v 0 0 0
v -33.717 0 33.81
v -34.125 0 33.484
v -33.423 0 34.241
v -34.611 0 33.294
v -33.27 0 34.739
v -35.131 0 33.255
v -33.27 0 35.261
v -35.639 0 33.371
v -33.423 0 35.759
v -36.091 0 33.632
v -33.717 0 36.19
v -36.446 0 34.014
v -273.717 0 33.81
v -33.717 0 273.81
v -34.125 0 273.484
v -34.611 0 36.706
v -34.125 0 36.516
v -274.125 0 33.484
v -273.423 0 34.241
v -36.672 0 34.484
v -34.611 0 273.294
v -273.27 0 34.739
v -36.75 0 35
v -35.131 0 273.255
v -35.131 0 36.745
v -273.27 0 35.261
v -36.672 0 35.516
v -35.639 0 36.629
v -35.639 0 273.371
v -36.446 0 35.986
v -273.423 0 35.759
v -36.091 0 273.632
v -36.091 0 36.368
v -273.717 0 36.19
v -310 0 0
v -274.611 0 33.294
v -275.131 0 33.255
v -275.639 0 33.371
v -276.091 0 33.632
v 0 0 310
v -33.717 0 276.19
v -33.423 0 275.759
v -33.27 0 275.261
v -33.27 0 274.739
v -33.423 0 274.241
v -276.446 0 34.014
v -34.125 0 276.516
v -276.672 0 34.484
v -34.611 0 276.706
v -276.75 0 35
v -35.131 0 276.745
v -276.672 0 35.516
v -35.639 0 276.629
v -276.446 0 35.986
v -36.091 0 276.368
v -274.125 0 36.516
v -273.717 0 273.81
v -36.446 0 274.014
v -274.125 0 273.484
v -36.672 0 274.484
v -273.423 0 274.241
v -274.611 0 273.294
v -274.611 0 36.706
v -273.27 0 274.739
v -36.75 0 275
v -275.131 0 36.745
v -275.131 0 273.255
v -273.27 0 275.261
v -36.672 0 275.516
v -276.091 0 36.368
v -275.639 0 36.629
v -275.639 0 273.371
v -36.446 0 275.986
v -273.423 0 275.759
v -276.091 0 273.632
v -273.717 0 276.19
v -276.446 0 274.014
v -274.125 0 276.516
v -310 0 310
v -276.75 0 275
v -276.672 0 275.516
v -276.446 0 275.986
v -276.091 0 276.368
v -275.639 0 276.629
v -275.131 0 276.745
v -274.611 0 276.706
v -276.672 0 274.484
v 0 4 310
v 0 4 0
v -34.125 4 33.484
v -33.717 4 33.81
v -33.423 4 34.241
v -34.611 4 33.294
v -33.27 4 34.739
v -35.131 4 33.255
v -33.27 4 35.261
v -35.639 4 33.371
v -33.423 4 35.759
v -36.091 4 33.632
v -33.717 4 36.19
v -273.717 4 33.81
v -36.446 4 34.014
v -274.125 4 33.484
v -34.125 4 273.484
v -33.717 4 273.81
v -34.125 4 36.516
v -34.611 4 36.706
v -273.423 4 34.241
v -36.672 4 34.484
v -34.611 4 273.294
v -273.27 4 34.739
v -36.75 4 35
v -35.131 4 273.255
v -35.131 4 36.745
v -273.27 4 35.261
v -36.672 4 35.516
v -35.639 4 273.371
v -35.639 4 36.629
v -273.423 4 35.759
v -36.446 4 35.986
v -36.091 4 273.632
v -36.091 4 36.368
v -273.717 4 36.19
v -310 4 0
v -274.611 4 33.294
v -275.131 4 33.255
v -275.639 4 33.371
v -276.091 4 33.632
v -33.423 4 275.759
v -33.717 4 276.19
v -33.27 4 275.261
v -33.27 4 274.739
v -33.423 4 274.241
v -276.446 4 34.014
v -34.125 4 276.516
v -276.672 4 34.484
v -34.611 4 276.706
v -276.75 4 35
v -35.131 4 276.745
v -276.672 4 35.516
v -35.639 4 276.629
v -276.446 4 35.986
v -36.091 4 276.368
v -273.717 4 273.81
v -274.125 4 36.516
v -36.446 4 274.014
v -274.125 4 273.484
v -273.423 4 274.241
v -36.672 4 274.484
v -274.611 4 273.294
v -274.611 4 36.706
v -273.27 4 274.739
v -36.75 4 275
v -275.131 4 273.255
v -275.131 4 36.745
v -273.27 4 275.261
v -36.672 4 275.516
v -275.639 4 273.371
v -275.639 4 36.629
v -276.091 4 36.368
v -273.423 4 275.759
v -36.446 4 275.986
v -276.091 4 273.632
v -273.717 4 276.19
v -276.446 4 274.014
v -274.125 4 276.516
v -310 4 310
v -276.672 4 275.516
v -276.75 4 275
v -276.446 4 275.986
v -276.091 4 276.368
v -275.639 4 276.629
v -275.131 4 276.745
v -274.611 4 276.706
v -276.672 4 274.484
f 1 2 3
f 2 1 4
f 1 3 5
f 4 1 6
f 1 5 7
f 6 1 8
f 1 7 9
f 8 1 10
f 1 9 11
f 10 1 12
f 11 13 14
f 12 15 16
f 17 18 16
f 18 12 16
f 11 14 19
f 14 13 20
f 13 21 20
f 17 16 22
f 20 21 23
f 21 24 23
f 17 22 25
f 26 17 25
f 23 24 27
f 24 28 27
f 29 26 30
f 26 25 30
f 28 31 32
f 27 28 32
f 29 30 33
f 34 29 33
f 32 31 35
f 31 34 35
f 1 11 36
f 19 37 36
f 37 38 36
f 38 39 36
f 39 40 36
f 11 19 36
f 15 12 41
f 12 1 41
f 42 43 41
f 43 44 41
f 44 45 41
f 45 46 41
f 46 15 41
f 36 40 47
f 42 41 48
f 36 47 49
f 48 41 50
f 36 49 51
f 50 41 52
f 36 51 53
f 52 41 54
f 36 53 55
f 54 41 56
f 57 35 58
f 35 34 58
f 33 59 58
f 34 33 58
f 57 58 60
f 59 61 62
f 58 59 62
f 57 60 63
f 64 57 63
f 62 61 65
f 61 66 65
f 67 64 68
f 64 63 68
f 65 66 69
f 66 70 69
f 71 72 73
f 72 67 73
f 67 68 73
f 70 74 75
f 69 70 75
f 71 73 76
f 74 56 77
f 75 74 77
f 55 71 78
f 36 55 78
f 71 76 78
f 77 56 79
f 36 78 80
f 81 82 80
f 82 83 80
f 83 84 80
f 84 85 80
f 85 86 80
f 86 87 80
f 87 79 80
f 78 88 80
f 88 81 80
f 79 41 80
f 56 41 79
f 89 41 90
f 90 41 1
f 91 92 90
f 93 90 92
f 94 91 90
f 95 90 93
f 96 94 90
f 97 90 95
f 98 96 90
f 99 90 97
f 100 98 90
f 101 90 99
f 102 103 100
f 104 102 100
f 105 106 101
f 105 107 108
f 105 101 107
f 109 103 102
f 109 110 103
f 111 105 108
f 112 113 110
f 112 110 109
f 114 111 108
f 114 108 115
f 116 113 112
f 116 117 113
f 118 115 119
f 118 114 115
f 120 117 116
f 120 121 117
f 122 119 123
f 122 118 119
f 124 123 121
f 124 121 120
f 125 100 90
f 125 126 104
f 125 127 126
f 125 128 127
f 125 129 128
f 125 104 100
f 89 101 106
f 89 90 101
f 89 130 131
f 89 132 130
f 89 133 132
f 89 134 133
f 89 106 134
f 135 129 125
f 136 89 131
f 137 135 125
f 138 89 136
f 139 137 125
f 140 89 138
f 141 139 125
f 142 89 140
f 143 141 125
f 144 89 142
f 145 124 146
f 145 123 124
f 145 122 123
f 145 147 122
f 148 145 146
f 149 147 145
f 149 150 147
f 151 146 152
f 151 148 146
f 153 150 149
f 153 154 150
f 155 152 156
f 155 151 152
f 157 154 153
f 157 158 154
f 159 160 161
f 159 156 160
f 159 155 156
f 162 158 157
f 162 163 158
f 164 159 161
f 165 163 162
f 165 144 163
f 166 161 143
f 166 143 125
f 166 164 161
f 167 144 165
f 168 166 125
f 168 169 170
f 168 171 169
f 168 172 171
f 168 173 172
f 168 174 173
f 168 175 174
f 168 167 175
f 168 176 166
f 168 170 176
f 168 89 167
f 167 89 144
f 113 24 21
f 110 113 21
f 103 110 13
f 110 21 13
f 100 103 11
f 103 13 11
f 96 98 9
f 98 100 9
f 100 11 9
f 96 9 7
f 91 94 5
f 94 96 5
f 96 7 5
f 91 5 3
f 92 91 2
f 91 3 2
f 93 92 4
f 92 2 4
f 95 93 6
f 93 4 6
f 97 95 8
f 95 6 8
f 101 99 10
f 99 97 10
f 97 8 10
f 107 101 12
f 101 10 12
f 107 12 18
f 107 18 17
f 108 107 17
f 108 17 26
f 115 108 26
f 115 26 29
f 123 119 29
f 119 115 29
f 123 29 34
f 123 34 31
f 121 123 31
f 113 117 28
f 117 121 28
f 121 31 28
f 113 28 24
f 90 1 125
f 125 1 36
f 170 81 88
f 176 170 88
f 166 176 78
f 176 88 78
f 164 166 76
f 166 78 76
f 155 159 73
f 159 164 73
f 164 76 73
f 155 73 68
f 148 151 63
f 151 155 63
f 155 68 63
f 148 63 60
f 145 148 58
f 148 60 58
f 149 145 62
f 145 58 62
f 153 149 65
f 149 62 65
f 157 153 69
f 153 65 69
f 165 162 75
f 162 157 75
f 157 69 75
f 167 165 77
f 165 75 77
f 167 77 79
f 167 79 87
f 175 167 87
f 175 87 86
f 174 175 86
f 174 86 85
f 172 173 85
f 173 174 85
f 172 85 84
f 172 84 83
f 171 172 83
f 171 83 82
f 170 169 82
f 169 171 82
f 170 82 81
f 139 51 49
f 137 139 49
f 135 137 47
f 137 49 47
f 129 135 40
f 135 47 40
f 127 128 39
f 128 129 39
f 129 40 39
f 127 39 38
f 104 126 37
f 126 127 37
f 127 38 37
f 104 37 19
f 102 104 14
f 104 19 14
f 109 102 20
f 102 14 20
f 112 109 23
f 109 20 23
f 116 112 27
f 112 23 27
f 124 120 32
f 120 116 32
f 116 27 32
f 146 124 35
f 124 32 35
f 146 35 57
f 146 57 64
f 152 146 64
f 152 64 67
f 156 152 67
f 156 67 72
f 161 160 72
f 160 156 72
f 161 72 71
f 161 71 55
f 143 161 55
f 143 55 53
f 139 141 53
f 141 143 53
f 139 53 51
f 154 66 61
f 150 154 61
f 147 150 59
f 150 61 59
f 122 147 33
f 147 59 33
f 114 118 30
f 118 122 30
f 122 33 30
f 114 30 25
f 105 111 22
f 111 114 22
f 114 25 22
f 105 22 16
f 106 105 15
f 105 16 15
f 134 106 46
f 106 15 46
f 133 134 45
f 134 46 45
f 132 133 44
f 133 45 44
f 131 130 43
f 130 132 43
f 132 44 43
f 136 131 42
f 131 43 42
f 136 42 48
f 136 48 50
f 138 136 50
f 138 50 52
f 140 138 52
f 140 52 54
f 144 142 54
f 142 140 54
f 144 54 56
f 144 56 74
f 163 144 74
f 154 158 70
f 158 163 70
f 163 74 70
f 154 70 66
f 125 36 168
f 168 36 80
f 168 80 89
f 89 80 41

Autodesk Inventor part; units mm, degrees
ref_plane "YZ Plane" through (0, 0, 0) normal (1, 0, 0) x (0, 1, 0)
ref_plane "XZ Plane" through (0, 0, 0) normal (0, 1, 0) x (-1, 0, 0)
ref_plane "XY Plane" through (0, 0, 0) normal (0, 0, 1) x (1, 0, 0)
sketch "Sketch1" plane through (0, 0, 0) normal (0, 1, 0) x (-1, 0, 0)
  line L0 (0, 0) -> (310, 0)
  line L1 (310, 0) -> (310, 310)
  line L2 (310, 310) -> (0, 310)
  line L3 (0, 310) -> (0, 0)
  circle A0 centre (35, 35) radius 1.75
  circle A1 centre (275, 35) radius 1.75
  circle A2 centre (35, 275) radius 1.75
  circle A3 centre (275, 275) radius 1.75
  dimension "d0" = 310
  dimension "d1" = 310
  dimension "d2" = 240
  dimension "d3" = 240
  dimension "d4" = 240
  dimension "d5" = 240
  dimension "d6" = 35
  dimension "d7" = 35
  dimension "d8" = 3.5
  dimension "d9" = 3.5
  dimension "d10" = 3.5
  dimension "d11" = 3.5
extrude "Extrusion1" add sketch "Sketch1" along normal blind 4
sketch "Sketch2" plane through (0, 4, 0) normal (0, 1, 0) x (1, 0, 0)
  line L0 (-298.7801, -142.1723) -> (8.953, -142.1723) construction
  line L1 (8.953, -142.1723) -> (8.953, -252.6087) construction
  line L2 (8.953, -252.6087) -> (-298.7801, -252.6087) construction
  line L3 (-298.7801, -252.6087) -> (-298.7801, -142.1723) construction
  point P0 (0, 0)
equation "\"d6\" = -0.5 * d2 + 0.5 * d1"
equation "\"d7\" = -0.5 * d2 + 0.5 * d1"
equation "\"d9\" = d8"
properties part number "heatbed"
